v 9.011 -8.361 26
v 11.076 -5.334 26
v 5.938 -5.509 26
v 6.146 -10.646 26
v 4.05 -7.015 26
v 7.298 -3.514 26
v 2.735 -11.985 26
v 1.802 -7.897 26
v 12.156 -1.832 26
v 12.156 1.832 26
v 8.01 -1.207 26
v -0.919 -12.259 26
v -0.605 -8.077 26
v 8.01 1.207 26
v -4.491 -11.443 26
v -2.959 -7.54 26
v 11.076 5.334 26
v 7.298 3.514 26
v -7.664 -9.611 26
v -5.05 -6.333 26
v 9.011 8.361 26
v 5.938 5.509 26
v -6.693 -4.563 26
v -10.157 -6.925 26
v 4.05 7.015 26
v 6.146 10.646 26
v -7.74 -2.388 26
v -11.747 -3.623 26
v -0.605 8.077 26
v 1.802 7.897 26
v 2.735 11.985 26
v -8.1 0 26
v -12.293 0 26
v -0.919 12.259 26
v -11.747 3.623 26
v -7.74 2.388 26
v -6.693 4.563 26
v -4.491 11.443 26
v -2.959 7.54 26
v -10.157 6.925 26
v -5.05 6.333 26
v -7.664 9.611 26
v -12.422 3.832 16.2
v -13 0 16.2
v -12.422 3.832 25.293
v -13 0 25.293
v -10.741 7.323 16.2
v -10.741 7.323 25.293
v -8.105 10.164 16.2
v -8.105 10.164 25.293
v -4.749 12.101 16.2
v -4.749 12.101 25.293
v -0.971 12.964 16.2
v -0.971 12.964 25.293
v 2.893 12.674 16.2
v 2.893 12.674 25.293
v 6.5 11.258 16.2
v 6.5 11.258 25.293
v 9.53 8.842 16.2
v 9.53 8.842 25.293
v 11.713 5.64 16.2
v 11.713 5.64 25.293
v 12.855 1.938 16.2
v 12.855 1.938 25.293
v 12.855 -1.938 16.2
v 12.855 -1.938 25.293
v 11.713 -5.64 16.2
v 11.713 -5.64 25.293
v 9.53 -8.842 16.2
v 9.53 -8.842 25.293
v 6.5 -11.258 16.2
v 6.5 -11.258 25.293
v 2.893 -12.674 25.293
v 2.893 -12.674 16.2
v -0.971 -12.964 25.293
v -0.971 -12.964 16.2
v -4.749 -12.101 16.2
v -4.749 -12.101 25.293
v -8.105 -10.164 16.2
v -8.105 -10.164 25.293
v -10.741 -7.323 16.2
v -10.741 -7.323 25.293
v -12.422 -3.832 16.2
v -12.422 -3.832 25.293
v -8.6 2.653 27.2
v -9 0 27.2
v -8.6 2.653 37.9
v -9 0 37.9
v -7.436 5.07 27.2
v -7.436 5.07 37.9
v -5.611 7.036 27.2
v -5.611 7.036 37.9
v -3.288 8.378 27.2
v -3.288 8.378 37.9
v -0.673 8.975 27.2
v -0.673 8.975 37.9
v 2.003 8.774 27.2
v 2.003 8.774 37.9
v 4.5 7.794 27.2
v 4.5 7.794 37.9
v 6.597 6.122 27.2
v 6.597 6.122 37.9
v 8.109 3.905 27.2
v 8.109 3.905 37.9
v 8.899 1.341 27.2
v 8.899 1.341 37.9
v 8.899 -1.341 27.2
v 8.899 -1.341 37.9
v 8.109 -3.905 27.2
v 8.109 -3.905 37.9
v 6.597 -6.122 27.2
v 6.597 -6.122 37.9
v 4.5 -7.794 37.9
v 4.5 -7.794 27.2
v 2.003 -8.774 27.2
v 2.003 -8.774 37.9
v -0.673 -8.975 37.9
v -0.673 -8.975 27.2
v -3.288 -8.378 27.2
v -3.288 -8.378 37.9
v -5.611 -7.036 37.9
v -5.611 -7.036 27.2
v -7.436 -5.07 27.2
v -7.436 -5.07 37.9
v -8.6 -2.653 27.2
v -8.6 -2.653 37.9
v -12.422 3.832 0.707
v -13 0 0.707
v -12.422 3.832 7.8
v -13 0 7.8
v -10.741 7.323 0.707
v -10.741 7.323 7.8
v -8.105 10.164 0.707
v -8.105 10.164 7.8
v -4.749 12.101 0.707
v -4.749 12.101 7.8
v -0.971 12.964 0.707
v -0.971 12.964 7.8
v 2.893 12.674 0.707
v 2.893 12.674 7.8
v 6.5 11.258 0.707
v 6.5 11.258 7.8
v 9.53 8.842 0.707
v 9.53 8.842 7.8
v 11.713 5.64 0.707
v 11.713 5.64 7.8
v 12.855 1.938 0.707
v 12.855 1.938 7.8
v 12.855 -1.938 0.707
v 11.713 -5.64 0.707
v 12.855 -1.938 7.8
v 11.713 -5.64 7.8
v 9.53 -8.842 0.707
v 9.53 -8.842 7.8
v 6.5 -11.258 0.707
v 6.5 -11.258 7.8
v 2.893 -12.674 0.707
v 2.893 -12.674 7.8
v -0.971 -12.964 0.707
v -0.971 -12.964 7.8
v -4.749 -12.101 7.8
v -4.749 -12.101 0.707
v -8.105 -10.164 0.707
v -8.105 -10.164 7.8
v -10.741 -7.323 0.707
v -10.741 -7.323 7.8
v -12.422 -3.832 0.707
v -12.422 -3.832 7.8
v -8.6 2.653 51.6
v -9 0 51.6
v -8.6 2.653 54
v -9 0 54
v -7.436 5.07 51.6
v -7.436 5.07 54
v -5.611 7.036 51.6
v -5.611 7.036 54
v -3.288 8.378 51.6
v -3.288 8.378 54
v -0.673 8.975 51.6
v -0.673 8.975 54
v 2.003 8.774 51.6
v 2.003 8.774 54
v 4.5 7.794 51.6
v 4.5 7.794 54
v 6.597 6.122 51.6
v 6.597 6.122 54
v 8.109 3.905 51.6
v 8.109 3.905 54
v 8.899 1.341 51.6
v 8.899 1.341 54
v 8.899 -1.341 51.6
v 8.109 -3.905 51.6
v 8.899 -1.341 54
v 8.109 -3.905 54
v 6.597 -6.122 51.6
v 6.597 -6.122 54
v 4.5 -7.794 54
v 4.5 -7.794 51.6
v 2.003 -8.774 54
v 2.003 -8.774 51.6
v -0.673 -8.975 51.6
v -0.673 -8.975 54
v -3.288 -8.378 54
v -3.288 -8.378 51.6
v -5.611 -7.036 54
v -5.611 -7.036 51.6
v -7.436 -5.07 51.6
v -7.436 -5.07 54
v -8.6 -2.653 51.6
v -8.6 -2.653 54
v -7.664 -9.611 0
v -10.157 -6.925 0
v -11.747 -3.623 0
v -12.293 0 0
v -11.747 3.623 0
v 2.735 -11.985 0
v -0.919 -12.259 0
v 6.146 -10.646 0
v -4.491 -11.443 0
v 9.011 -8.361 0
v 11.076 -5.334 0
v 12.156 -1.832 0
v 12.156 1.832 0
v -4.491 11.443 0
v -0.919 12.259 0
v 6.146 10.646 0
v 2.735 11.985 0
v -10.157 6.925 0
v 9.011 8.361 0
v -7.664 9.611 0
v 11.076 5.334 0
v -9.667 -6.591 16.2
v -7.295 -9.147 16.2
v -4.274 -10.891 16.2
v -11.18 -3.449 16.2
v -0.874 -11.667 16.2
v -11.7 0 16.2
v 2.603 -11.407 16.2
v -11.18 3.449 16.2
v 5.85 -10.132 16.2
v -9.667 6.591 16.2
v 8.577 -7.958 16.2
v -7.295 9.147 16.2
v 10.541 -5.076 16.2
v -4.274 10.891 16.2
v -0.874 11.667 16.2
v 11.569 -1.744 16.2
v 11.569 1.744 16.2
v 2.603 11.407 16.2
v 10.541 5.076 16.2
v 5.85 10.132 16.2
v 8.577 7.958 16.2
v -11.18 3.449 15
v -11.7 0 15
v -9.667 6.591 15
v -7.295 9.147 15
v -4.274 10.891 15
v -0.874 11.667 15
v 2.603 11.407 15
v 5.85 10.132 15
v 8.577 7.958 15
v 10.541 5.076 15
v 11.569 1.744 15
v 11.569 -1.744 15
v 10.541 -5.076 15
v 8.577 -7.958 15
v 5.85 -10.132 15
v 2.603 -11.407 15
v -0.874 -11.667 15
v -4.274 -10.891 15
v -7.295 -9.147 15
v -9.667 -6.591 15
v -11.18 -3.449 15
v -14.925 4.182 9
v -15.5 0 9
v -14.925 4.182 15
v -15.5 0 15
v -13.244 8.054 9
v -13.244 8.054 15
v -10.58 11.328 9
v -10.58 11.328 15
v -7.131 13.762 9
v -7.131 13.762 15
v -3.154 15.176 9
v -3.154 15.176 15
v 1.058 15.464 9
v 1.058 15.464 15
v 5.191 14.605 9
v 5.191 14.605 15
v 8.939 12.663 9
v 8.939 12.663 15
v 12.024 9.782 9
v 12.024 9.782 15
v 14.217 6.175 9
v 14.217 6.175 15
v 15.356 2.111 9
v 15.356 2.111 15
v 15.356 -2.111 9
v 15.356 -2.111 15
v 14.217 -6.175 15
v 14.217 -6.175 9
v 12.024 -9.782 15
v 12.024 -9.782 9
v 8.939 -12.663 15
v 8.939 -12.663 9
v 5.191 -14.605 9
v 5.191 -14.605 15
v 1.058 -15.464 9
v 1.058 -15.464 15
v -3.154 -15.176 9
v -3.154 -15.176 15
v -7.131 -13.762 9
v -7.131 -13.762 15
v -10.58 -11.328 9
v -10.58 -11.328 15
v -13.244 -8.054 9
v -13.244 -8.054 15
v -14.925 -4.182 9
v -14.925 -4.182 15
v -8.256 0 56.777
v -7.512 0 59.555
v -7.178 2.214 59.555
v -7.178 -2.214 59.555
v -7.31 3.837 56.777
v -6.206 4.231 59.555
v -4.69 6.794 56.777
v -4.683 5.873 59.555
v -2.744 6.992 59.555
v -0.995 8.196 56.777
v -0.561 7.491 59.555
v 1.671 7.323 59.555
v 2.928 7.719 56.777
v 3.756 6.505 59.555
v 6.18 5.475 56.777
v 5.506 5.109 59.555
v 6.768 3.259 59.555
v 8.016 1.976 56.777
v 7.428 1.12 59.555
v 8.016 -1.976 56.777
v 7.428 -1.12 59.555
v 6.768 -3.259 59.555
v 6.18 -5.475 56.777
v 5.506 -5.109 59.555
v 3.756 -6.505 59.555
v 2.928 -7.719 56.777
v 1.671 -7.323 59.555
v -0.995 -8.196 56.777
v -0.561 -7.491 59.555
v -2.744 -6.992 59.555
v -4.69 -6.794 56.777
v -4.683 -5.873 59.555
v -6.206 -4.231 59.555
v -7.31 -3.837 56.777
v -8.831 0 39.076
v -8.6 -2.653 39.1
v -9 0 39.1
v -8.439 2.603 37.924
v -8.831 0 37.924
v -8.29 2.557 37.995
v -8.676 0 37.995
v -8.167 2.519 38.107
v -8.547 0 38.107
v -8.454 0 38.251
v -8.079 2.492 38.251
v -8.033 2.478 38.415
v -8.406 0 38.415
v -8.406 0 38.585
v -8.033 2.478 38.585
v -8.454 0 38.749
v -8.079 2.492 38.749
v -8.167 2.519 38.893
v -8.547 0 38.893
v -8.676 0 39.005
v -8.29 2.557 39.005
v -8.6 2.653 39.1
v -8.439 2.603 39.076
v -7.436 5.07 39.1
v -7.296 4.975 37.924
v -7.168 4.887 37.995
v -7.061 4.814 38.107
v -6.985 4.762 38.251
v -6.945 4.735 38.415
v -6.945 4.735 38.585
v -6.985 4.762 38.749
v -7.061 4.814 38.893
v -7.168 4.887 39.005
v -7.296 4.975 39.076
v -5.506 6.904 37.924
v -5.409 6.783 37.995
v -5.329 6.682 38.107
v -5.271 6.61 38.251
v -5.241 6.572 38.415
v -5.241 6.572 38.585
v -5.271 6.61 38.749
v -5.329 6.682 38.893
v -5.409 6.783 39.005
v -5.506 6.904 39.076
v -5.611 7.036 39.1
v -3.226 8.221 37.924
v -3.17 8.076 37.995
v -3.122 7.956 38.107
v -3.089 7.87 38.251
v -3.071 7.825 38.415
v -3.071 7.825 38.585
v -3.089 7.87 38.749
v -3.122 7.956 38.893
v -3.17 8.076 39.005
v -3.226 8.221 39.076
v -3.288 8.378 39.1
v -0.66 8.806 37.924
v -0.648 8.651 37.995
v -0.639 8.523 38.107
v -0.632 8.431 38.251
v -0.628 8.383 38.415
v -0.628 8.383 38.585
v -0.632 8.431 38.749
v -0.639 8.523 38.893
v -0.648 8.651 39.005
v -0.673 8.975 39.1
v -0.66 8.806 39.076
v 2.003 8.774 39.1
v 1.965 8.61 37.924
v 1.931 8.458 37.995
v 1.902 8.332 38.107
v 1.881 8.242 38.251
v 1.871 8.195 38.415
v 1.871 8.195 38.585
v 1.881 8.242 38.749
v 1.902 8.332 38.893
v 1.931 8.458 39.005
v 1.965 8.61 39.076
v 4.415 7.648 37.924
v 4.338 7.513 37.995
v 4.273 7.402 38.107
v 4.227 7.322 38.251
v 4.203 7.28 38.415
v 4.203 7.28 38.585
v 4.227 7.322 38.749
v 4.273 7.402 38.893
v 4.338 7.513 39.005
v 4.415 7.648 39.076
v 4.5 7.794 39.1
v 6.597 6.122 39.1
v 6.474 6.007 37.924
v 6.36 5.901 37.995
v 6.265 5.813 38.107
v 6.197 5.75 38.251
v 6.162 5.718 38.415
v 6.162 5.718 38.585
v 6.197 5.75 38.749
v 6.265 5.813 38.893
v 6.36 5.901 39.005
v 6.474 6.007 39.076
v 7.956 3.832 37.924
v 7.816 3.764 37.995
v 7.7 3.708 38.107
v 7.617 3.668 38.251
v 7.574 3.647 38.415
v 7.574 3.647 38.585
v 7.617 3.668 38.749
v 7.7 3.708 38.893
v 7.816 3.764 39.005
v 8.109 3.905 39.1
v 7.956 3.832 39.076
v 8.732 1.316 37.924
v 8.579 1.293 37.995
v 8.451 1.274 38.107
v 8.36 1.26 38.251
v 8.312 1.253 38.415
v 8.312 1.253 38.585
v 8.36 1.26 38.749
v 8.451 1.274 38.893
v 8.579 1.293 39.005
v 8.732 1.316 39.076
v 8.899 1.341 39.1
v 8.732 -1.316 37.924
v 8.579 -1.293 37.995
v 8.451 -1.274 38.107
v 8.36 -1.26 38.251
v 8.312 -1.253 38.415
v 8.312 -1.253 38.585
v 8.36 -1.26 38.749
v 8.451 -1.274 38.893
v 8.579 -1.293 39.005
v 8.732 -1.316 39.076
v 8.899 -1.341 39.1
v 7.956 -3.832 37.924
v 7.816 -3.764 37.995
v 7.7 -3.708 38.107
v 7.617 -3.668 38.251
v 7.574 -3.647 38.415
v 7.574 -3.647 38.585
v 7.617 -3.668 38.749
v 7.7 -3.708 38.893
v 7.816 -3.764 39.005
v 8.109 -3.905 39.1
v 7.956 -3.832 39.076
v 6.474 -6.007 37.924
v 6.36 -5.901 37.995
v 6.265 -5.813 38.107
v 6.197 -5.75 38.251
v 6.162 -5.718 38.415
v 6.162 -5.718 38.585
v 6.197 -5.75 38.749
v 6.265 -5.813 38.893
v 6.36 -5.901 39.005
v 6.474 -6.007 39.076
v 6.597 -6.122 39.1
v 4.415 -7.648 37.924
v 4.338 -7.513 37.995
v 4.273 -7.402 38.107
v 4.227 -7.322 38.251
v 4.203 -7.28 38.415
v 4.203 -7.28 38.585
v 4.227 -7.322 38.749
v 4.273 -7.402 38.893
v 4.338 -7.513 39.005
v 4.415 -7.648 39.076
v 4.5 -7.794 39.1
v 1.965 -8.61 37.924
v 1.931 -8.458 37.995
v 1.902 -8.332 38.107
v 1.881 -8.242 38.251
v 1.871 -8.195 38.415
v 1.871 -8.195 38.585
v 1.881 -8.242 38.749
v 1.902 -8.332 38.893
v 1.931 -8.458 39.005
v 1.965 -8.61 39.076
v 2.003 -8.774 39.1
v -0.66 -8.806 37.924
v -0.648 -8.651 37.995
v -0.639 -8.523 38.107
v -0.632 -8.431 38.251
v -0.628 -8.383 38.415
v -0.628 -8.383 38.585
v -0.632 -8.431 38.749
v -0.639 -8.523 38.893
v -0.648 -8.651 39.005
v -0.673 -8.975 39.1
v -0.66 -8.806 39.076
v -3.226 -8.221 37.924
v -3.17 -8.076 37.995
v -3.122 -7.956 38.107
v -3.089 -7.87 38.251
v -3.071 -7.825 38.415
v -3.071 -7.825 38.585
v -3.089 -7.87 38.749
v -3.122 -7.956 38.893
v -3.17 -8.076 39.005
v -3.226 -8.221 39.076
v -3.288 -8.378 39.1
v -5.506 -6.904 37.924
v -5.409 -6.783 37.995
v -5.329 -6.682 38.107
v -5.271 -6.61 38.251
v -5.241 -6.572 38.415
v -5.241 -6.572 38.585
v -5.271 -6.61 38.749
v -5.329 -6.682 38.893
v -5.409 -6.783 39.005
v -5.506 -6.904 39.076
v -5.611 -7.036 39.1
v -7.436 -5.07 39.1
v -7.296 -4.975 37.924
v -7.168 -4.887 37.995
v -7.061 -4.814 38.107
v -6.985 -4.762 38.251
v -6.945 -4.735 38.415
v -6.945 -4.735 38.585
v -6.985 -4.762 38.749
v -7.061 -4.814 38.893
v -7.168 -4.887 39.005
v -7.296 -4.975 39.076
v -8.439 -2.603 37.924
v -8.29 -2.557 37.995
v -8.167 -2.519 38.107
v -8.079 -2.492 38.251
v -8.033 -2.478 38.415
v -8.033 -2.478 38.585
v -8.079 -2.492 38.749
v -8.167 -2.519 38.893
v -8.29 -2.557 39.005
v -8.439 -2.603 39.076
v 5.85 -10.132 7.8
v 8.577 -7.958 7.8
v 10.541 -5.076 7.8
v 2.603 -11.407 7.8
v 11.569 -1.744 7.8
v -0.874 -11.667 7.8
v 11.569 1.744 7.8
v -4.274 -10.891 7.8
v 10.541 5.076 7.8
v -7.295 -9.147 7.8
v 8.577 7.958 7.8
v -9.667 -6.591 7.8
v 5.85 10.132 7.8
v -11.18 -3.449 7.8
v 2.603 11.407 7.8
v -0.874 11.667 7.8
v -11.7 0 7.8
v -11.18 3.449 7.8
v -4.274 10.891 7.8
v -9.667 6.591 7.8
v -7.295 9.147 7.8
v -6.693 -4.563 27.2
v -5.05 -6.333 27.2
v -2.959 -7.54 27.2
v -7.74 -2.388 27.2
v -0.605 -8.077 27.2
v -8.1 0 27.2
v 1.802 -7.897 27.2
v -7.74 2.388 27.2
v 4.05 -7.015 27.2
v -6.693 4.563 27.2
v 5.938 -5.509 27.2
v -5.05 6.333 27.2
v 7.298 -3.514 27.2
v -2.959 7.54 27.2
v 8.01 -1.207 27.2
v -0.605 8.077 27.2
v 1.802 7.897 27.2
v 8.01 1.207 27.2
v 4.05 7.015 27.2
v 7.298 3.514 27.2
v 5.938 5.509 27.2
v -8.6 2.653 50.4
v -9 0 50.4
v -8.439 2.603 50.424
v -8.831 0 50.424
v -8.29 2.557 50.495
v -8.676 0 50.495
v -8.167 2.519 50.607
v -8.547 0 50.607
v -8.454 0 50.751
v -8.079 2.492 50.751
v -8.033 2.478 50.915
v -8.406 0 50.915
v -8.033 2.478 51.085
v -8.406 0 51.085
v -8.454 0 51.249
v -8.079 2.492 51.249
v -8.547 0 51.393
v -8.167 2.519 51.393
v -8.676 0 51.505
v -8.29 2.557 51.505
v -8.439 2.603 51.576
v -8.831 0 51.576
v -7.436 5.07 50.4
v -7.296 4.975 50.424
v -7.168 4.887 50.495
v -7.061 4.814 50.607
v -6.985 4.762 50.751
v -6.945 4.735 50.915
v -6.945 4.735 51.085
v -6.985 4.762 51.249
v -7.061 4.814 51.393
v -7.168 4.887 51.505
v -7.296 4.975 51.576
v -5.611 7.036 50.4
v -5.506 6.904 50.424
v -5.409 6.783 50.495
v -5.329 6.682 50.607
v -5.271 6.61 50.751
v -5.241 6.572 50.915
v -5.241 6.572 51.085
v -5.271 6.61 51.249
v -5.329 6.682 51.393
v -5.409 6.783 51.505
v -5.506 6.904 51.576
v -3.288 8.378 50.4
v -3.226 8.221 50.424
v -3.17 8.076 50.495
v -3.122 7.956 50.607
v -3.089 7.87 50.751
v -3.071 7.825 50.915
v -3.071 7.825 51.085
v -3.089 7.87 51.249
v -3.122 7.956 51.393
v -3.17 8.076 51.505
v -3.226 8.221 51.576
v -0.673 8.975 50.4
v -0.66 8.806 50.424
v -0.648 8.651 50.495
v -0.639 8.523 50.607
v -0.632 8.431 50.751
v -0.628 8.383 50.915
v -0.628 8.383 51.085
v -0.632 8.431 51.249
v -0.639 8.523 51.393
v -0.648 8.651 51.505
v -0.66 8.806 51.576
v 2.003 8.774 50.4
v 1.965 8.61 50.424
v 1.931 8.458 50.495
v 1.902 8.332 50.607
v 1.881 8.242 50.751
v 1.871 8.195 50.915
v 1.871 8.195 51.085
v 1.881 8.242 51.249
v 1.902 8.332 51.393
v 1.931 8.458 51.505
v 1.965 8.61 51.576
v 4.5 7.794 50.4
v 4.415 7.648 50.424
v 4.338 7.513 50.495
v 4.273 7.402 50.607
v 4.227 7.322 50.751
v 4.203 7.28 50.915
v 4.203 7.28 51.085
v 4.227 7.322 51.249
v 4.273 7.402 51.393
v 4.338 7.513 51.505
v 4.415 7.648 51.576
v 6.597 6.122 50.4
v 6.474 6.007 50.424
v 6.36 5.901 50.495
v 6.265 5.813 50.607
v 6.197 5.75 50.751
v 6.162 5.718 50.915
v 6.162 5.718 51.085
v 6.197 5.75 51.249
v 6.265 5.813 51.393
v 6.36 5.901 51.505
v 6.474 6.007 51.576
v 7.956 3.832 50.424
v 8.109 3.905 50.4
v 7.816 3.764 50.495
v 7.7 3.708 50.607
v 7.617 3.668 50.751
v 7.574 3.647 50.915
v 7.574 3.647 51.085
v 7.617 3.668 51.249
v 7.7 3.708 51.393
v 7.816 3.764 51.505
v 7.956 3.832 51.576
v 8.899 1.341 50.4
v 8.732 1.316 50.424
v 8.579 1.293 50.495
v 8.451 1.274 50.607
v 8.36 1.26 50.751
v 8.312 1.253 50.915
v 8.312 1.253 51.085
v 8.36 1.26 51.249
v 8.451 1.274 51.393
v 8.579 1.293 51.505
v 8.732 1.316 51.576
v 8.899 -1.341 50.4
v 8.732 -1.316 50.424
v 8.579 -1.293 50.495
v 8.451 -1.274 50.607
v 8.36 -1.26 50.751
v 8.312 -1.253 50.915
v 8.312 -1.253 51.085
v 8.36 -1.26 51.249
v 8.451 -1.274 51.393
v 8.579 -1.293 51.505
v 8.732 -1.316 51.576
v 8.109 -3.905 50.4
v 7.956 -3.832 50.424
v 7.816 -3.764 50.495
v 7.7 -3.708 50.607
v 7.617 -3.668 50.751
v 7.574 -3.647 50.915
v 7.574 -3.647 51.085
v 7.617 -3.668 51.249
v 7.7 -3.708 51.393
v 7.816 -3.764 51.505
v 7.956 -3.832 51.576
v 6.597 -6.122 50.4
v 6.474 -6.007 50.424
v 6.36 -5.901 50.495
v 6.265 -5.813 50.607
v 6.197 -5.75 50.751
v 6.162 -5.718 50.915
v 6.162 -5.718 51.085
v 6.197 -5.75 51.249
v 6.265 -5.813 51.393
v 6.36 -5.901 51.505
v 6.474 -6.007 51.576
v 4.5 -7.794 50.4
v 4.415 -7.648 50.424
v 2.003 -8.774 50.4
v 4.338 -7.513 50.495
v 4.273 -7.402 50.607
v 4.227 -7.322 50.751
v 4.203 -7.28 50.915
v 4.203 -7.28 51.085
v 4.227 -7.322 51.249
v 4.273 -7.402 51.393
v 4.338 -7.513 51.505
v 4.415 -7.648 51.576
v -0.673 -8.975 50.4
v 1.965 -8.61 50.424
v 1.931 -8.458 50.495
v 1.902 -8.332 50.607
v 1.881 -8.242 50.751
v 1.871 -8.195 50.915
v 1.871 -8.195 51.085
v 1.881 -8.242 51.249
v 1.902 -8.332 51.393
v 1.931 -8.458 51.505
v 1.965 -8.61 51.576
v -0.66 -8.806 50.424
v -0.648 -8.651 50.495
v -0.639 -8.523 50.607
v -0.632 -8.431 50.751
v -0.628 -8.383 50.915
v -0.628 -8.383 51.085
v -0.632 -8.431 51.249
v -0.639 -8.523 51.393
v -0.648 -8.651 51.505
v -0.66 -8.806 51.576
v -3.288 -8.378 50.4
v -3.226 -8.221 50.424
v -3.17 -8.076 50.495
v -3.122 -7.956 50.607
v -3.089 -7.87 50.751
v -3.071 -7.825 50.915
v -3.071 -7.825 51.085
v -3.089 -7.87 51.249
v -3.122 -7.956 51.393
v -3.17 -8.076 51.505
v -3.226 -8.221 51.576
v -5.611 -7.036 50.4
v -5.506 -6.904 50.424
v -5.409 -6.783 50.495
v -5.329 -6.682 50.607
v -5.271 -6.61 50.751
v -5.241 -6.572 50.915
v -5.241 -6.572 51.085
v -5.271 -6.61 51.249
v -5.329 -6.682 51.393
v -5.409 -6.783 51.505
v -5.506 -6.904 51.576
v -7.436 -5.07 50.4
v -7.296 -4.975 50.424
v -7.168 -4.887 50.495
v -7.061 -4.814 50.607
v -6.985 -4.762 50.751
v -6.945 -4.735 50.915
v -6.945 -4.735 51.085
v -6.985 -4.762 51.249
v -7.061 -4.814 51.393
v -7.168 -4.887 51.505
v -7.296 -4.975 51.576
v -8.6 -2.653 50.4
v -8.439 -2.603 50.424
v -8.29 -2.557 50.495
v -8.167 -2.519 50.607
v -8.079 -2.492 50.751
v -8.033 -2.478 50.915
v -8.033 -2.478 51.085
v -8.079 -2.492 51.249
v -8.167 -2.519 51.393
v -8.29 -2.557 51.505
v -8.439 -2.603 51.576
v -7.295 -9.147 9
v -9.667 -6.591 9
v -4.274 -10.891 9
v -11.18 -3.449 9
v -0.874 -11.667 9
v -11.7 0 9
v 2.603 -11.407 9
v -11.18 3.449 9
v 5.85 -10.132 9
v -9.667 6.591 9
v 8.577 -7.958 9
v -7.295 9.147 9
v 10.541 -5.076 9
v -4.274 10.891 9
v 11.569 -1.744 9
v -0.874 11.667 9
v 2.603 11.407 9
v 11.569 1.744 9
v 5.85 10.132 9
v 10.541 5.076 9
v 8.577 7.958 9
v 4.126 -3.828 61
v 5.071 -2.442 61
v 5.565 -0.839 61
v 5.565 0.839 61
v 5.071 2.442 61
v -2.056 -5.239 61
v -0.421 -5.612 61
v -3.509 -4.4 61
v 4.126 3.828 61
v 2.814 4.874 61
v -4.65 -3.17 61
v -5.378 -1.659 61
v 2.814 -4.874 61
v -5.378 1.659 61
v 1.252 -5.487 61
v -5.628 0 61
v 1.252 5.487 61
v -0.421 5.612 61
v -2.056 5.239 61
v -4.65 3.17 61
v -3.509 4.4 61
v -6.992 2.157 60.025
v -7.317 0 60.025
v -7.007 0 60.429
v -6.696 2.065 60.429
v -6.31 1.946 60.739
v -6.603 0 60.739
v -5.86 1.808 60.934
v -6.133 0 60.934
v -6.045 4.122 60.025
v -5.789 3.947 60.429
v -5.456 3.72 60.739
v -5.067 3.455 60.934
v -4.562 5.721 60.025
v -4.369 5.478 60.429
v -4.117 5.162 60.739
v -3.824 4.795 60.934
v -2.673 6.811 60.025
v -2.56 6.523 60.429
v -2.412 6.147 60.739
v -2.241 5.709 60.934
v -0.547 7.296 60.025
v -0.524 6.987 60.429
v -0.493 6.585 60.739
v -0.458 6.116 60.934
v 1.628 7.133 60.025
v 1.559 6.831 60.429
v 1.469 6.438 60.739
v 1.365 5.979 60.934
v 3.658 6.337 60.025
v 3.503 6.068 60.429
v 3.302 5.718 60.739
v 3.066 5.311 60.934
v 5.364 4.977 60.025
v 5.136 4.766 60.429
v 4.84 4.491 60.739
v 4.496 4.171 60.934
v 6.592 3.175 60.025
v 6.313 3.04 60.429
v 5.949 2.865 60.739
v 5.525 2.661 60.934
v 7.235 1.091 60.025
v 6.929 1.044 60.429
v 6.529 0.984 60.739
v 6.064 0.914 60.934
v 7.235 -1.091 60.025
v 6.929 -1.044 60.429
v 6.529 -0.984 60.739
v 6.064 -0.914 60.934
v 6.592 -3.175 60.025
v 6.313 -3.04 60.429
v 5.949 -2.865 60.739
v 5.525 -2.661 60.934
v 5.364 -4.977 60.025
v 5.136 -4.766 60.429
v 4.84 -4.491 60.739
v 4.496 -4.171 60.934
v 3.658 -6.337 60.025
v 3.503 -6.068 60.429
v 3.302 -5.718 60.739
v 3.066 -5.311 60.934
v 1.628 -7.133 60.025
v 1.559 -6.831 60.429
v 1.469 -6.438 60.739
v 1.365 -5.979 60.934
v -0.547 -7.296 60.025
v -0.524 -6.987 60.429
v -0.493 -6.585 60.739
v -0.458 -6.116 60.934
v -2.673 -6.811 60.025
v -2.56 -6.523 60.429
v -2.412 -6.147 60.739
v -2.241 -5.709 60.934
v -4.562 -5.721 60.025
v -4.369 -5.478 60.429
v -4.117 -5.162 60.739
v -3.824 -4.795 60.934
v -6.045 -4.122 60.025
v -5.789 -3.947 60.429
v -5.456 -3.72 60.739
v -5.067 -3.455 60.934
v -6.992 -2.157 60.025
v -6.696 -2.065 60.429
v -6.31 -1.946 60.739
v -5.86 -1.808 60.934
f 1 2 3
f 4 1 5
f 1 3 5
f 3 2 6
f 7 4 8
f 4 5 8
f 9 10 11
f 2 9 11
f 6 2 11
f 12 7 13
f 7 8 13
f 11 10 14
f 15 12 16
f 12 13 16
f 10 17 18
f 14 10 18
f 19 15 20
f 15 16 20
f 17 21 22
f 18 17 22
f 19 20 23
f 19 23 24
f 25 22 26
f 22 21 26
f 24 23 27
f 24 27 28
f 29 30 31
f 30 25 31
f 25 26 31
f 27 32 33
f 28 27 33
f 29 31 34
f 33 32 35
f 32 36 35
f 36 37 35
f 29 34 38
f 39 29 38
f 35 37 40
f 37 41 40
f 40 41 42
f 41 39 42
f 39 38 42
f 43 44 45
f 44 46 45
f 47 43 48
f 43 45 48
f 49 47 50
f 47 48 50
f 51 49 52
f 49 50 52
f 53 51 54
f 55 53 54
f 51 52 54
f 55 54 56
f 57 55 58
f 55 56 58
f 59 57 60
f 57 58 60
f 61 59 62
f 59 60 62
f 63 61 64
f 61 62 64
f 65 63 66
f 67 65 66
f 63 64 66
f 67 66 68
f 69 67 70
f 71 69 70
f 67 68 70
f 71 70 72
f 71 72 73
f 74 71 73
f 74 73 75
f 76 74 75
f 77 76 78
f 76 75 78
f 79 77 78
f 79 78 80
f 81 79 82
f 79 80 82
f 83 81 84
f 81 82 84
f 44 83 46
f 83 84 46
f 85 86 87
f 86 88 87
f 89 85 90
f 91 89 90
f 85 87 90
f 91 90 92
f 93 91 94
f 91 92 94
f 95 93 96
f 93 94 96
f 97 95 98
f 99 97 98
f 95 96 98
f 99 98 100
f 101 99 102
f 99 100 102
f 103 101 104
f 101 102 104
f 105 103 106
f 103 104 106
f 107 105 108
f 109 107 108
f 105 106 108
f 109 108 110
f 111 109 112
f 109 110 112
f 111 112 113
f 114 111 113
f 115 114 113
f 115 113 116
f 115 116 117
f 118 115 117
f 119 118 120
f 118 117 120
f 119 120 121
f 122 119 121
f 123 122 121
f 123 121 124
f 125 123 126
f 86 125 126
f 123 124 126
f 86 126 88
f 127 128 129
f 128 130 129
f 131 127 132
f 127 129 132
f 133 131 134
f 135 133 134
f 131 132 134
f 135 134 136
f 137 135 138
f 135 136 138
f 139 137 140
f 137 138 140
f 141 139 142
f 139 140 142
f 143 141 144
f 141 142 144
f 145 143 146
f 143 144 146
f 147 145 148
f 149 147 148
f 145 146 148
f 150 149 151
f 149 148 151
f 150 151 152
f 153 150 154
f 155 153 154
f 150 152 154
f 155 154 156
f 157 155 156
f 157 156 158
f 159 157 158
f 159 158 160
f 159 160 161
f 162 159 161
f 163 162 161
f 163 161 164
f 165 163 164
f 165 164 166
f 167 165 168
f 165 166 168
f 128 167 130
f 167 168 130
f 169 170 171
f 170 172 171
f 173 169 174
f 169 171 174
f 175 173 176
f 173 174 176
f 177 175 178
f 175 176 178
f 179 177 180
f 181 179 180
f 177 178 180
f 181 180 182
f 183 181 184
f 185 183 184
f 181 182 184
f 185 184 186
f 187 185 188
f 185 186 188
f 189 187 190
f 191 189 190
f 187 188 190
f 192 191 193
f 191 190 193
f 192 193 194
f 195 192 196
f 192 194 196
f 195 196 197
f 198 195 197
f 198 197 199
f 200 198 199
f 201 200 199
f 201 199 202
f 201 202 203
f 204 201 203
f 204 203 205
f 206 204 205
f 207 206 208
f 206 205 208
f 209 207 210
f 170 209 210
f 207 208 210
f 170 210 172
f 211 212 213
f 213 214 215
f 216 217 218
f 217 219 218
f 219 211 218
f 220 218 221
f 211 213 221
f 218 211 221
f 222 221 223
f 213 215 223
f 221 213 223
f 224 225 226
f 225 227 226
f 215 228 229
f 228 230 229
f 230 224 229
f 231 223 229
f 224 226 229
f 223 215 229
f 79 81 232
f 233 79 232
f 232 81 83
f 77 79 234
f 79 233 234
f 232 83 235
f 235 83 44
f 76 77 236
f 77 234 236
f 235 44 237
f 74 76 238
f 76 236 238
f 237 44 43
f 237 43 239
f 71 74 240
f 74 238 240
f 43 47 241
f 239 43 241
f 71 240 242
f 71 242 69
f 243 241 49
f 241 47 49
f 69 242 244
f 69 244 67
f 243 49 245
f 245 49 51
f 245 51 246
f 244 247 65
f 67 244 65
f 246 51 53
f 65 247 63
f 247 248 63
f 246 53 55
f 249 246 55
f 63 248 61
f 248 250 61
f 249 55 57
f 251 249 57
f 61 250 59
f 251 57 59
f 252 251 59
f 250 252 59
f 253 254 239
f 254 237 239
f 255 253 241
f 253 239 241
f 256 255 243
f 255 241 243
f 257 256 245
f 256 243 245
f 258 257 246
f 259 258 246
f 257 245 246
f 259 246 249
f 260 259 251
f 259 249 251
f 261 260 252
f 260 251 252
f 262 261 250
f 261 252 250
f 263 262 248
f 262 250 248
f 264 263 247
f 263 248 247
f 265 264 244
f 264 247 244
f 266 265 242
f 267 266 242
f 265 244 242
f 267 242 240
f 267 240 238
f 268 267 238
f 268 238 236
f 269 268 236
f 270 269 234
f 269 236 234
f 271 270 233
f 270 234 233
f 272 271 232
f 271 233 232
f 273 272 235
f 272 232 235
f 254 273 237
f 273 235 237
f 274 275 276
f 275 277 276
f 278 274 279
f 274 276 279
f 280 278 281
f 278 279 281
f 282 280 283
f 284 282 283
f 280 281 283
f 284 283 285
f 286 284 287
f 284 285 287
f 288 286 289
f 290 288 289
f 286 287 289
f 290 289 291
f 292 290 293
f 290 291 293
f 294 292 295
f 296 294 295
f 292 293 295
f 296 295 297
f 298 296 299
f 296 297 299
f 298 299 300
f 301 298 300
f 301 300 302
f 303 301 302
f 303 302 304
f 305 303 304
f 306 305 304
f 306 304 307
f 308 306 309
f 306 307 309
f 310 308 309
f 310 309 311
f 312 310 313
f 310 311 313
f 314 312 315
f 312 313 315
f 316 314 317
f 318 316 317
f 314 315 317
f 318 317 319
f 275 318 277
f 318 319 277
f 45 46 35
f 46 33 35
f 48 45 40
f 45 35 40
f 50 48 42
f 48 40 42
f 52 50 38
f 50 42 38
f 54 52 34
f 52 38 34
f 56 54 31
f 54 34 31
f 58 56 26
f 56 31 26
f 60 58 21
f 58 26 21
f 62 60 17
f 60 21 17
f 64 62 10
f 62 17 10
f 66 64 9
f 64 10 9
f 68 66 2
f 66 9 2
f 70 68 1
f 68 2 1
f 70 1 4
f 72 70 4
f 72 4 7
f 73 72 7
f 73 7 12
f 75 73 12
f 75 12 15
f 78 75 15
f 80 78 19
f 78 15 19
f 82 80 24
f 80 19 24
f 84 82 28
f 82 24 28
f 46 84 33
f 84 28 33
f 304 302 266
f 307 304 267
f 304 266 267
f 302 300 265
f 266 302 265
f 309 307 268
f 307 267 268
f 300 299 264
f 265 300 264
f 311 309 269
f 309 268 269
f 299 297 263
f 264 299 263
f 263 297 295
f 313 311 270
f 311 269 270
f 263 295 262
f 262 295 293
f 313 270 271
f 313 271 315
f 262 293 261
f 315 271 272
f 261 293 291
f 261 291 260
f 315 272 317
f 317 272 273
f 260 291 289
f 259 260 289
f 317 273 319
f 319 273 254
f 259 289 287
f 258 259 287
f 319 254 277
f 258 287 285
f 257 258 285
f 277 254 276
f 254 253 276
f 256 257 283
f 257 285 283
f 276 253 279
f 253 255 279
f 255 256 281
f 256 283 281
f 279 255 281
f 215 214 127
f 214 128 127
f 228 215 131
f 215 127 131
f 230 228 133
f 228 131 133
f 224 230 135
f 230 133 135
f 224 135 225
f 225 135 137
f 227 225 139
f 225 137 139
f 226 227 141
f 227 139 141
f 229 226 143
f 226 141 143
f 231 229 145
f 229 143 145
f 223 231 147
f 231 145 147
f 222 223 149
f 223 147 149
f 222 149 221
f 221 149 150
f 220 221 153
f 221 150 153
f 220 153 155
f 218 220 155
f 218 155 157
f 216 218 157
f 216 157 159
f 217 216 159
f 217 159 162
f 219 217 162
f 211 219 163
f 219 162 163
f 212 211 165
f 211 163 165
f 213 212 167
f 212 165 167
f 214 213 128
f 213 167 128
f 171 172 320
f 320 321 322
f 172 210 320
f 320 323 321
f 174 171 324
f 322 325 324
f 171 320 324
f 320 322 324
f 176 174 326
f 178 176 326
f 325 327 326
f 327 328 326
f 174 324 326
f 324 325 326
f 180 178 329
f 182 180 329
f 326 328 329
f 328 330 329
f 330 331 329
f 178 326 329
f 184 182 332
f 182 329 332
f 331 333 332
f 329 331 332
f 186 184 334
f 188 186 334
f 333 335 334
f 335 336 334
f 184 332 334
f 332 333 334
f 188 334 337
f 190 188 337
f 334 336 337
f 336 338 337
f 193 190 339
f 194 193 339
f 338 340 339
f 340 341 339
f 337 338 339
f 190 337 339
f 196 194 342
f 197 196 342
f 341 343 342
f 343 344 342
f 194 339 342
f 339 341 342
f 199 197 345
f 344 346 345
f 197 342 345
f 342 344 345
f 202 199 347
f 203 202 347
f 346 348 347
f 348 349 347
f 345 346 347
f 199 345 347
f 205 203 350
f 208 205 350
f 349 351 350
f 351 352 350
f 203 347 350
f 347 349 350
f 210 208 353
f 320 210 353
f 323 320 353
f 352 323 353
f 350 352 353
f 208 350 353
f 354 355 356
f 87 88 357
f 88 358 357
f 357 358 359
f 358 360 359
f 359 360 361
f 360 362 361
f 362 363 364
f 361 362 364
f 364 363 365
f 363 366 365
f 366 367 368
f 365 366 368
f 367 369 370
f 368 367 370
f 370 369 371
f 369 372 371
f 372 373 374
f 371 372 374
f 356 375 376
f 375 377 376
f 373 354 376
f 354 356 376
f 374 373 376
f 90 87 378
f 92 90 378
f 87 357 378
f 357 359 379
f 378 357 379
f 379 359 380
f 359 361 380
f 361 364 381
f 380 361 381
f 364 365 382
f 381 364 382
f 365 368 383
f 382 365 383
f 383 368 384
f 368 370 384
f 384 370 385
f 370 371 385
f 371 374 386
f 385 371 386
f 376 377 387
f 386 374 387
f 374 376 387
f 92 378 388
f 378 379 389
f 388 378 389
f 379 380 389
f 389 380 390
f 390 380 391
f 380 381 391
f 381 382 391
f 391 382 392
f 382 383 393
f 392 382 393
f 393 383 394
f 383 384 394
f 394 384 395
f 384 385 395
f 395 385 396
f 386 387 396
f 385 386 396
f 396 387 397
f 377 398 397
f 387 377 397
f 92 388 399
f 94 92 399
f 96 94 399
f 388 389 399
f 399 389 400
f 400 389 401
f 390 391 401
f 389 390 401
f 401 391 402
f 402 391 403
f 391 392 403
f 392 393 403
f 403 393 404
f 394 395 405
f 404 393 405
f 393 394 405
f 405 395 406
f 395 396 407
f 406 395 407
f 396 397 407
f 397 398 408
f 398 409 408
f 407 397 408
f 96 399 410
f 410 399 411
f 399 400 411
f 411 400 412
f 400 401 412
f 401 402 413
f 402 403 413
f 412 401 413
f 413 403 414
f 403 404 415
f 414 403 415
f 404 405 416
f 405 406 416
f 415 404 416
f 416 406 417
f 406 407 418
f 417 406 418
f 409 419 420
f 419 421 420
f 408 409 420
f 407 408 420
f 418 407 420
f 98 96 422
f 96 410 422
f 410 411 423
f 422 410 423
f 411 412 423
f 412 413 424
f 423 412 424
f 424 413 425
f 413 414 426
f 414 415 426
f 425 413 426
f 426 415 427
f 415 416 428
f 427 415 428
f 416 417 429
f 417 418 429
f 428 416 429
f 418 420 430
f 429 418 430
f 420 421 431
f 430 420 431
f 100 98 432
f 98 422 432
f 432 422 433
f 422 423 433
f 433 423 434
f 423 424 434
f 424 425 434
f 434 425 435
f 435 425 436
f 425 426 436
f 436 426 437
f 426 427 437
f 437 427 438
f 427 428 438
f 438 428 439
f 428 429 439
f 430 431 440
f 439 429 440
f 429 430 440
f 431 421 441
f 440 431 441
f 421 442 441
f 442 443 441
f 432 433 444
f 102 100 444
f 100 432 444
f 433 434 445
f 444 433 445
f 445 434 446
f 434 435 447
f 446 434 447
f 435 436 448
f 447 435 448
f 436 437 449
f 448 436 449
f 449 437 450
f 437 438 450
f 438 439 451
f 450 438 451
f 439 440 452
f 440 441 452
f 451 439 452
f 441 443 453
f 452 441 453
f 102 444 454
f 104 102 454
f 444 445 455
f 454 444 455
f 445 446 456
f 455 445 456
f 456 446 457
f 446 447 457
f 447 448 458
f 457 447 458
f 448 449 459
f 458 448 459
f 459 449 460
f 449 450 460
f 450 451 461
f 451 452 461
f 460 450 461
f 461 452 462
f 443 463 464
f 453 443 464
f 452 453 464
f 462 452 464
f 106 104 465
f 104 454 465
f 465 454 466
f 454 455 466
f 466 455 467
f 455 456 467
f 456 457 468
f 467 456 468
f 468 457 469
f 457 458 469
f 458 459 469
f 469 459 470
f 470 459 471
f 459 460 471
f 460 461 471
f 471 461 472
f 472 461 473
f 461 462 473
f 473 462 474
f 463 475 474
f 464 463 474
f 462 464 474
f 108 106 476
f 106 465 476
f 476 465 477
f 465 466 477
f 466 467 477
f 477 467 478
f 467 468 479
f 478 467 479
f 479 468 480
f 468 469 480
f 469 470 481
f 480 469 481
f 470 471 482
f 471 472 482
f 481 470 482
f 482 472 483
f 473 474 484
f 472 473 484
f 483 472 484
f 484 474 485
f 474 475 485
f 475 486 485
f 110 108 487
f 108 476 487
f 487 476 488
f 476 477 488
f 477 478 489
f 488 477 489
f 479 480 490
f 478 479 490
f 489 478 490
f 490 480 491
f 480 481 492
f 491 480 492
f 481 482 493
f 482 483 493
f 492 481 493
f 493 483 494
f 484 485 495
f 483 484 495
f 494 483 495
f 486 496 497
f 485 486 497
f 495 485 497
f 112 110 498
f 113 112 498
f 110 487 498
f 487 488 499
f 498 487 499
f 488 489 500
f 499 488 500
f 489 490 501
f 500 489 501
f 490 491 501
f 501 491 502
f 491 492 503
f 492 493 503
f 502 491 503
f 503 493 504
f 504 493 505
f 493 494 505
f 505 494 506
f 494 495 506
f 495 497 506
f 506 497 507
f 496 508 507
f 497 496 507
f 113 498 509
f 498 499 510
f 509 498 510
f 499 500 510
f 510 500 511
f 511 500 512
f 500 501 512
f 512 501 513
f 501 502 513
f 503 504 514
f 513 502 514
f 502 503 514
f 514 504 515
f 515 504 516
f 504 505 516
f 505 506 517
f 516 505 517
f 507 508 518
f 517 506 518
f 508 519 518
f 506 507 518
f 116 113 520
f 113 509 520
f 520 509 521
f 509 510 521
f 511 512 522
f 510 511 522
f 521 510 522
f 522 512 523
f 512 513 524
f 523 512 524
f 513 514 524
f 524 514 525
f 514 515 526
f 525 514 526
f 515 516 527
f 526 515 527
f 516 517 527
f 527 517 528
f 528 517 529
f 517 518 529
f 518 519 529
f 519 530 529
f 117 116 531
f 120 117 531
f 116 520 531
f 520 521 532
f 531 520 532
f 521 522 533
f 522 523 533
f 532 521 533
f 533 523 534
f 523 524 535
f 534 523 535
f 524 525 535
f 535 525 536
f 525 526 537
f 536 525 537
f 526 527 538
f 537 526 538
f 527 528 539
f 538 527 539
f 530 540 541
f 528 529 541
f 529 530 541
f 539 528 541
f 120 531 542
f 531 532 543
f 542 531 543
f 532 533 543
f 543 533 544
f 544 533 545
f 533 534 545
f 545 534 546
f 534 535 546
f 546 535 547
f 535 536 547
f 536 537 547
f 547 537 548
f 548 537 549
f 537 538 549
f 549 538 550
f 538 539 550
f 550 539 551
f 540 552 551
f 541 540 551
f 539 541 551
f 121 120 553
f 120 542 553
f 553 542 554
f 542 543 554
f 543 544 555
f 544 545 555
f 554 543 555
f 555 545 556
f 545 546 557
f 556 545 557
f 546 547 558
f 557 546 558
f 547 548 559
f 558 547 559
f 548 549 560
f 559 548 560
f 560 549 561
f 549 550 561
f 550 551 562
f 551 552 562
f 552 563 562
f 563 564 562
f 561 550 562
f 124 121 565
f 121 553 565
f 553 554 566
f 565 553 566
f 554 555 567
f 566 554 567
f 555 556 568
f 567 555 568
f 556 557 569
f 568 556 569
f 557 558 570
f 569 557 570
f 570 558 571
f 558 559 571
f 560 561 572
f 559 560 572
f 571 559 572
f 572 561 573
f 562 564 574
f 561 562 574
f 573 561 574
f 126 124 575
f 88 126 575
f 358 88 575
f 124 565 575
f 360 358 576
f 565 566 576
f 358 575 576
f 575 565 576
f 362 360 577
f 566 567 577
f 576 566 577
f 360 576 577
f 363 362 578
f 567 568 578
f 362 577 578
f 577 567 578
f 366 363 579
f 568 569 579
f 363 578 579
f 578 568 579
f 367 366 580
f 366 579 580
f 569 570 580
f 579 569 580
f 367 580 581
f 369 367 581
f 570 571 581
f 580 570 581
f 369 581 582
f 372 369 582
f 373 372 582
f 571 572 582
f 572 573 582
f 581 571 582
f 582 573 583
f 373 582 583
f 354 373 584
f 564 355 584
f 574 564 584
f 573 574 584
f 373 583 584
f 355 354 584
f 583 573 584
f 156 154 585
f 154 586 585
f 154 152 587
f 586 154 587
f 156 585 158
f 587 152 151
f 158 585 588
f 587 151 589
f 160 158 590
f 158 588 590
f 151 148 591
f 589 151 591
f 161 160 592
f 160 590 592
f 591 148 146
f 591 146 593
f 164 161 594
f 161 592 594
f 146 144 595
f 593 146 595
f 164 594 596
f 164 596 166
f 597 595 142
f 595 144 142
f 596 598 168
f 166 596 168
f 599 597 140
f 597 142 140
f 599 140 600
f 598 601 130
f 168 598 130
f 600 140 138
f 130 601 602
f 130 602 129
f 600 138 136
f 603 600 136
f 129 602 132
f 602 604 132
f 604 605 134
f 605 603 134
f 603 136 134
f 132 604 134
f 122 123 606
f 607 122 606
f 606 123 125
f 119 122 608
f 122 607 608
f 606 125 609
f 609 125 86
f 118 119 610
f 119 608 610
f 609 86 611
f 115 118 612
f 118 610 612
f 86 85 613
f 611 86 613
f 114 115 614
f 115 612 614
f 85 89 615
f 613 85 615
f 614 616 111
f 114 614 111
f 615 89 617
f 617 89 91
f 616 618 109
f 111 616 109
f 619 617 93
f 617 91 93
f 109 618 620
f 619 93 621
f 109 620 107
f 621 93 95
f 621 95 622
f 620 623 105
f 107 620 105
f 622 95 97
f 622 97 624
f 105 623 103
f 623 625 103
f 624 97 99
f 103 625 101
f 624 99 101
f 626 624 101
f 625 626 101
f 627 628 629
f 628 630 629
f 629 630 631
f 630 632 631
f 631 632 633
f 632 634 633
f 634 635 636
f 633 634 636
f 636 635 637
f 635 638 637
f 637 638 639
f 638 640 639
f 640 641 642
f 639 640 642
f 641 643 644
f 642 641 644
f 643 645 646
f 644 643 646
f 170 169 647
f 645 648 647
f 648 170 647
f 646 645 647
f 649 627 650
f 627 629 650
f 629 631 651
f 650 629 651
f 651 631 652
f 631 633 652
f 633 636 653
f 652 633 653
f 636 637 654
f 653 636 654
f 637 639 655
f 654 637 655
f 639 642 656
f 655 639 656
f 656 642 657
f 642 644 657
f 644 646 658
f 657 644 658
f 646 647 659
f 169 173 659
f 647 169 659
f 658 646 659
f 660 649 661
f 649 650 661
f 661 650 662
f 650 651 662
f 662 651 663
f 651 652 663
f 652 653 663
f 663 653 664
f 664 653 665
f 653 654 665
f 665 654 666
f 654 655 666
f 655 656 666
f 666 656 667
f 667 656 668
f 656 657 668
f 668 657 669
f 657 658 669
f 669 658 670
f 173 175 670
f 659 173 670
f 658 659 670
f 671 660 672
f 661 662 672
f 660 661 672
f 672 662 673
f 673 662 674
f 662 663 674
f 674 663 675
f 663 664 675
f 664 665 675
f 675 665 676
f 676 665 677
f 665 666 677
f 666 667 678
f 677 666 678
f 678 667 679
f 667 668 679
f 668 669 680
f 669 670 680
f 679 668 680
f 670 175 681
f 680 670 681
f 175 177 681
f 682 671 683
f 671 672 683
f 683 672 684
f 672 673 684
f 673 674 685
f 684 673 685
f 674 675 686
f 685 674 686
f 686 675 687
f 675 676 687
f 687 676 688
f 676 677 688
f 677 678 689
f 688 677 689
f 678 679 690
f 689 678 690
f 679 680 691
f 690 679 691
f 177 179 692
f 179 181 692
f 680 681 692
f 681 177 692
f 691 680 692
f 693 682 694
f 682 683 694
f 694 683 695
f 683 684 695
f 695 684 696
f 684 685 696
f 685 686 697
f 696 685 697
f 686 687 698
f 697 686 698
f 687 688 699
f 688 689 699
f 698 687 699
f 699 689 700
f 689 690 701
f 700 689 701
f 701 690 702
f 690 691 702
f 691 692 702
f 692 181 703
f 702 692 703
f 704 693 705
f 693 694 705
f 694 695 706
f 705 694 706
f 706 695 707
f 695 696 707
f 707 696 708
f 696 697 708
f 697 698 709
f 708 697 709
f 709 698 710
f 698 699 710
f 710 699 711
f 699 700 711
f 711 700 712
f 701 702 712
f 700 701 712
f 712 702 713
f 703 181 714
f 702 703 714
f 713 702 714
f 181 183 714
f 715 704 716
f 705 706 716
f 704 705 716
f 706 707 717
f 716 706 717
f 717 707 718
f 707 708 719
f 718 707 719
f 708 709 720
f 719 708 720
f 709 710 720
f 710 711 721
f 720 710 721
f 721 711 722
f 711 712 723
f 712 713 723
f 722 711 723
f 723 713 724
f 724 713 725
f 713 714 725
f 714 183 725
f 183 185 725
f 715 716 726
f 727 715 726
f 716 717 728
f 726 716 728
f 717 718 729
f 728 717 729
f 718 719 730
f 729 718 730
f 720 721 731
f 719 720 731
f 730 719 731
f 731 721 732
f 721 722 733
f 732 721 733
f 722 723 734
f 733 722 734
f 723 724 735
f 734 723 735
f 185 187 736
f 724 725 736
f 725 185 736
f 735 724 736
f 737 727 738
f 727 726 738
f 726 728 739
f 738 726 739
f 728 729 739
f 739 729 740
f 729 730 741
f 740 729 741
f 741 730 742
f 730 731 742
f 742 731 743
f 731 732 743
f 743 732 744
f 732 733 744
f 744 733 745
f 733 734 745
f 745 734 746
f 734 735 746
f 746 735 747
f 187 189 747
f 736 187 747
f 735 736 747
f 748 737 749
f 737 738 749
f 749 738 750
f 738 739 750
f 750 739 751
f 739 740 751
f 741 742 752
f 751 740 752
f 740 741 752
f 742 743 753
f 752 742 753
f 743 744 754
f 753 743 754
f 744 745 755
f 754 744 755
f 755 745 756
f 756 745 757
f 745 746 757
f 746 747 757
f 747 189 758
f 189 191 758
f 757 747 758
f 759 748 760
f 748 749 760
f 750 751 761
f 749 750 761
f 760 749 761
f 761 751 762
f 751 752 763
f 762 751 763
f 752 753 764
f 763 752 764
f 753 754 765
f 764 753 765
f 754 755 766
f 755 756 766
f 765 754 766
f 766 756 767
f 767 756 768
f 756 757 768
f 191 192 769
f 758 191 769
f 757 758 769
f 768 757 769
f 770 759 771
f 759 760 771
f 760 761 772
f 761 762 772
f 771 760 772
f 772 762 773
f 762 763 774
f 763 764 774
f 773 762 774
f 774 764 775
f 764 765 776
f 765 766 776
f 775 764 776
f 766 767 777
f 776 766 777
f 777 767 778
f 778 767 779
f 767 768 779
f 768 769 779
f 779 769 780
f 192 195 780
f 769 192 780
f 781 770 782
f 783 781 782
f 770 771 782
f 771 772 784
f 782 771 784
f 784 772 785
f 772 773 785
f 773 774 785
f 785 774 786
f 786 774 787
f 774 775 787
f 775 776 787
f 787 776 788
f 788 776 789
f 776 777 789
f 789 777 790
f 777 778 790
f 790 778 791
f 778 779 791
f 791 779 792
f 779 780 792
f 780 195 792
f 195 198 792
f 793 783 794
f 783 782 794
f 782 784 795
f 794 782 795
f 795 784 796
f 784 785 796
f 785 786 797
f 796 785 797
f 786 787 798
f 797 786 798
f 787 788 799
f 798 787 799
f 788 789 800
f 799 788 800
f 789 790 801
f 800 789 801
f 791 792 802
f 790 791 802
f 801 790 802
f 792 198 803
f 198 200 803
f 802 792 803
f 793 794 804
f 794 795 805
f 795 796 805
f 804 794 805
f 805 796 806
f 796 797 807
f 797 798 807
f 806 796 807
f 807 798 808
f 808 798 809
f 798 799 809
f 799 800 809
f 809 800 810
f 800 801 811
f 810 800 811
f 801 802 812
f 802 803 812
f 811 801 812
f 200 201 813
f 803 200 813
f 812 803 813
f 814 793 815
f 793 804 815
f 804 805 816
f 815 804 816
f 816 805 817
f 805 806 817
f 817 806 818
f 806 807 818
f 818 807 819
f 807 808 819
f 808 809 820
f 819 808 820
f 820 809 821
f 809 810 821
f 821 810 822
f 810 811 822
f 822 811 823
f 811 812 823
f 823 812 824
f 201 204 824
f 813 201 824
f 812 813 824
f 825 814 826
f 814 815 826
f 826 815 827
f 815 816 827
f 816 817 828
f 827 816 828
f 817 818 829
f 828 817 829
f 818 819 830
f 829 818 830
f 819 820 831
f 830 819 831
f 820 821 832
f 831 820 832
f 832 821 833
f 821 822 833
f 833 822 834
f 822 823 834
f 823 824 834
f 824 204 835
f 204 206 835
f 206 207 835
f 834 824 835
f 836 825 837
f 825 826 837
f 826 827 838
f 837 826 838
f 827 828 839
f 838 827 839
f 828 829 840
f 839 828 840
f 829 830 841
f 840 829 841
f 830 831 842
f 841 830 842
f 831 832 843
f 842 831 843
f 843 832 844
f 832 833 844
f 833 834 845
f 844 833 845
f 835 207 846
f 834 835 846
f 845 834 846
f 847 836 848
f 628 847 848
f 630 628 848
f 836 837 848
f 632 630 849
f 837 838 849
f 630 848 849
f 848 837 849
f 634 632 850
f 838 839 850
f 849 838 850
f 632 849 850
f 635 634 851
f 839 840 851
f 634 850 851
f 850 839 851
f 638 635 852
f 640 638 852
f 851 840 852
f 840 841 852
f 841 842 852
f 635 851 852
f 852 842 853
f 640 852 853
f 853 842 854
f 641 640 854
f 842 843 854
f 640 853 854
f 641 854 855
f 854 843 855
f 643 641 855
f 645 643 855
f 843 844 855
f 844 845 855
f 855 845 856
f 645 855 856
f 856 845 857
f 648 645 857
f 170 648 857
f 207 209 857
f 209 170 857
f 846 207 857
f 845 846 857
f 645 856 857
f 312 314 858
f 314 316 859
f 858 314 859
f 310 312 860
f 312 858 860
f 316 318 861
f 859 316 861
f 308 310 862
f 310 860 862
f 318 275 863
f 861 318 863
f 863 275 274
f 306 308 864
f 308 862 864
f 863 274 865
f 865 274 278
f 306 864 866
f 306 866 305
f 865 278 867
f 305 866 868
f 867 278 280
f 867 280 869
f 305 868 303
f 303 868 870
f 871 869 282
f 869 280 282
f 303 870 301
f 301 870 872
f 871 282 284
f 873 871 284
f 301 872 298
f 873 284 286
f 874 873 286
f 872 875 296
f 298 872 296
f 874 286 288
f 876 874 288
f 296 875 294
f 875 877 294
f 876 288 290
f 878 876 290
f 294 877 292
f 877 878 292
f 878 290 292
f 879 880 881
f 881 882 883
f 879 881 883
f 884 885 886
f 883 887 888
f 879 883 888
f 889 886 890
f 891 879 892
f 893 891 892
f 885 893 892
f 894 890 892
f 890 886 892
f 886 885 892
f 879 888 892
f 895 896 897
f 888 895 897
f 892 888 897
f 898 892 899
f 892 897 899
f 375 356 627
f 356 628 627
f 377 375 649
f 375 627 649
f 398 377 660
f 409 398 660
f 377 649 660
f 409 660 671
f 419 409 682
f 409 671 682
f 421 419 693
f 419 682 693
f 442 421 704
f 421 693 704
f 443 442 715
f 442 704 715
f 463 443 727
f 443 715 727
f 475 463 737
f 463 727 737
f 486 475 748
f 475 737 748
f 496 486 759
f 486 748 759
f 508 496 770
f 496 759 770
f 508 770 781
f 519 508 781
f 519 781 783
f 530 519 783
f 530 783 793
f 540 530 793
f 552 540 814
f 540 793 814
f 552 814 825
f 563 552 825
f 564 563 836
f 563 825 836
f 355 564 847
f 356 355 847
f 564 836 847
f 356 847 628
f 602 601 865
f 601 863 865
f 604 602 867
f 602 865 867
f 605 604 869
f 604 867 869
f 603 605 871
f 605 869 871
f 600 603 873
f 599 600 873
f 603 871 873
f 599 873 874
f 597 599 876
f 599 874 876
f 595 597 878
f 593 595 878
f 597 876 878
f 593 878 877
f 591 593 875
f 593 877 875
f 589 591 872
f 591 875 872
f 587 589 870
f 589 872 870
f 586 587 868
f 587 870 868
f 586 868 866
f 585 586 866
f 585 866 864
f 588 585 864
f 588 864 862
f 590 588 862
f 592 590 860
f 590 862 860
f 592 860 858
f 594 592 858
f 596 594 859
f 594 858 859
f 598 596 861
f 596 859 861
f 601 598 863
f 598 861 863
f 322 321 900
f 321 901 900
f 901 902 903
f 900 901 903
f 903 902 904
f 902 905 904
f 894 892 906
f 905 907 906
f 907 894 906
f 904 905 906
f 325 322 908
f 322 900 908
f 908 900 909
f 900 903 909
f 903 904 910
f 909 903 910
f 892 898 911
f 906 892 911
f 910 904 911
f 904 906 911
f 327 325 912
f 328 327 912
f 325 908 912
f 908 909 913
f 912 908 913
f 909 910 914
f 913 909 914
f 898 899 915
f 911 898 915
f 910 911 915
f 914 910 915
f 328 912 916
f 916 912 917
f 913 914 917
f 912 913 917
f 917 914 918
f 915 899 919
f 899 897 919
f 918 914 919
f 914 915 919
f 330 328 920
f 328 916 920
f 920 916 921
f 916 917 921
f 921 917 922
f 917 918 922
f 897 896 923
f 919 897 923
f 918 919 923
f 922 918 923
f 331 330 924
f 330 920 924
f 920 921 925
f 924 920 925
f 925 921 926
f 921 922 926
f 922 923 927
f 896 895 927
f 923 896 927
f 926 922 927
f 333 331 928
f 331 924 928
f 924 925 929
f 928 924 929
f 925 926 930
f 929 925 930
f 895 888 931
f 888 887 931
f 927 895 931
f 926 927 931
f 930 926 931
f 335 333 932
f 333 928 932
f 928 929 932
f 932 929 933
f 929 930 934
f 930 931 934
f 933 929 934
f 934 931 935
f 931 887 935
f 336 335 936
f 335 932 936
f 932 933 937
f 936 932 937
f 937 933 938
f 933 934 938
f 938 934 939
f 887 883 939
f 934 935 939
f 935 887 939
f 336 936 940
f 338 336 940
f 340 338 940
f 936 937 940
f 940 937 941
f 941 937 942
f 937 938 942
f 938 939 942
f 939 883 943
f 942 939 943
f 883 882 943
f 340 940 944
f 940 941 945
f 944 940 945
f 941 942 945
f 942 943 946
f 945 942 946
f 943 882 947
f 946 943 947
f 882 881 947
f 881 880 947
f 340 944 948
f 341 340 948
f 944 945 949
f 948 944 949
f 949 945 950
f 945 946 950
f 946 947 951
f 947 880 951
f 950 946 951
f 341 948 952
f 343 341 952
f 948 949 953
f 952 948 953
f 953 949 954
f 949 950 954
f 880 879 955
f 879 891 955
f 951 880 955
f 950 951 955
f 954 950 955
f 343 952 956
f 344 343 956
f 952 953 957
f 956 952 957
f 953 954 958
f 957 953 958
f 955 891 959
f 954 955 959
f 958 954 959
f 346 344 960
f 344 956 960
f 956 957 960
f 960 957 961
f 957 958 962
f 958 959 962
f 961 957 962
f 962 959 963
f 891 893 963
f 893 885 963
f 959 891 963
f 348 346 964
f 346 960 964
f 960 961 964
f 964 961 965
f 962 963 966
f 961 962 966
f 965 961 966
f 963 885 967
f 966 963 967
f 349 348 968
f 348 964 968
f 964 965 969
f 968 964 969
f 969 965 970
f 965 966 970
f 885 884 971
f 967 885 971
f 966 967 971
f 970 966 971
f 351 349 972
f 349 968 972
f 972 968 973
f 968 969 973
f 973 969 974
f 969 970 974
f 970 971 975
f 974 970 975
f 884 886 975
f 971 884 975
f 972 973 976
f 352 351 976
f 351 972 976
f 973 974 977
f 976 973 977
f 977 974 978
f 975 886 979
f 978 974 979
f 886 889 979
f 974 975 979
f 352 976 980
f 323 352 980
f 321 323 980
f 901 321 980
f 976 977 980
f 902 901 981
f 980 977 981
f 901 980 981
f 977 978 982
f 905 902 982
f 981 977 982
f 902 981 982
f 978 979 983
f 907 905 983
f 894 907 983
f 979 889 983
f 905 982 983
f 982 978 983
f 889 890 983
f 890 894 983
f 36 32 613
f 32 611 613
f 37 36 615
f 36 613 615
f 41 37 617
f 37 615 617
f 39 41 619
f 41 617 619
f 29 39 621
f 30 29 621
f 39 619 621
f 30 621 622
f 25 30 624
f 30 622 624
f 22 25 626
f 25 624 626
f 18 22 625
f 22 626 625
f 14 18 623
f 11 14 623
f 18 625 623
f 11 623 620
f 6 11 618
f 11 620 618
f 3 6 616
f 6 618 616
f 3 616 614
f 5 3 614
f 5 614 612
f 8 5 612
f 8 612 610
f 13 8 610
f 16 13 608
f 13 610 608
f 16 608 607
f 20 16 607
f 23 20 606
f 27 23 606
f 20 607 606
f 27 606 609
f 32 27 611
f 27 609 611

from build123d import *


with BuildPart() as part:
    # Эскиз1 → Повернуть1 (revolve)
    with BuildSketch(Plane.XZ, mode=Mode.PRIVATE) as revolve_1_sk:
        with BuildLine():
            Line((5.628068026, 61), (0, 61))
            Line((0, 61), (0, 0))
            Line((0, 0), (12.292893219, 0))
            Line((12.292893219, 0), (13, 0.707106781))
            Line((13, 0.707106781), (13, 7.8))
            Line((13, 7.8), (11.7, 7.8))
            Line((11.7, 7.8), (11.7, 9))
            Line((11.7, 9), (15.5, 9))
            Line((15.5, 9), (15.5, 15))
            Line((15.5, 15), (11.7, 15))
            Line((11.7, 15), (11.7, 16.2))
            Line((11.7, 16.2), (13, 16.2))
            Line((13, 16.2), (13, 25.292893219))
            Line((13, 25.292893219), (12.292893219, 26))
            Line((12.292893219, 26), (8.1, 26))
            Line((8.1, 26), (8.1, 27.2))
            Line((8.1, 27.2), (9, 27.2))
            Line((9, 27.2), (9, 37.8999999))
            ThreePointArc((9, 37.8999999), (8.4, 38.4999999), (9, 39.0999999))
            Line((9, 39.0999999), (9, 50.4))
            ThreePointArc((9, 50.4), (8.4, 51), (9, 51.6))
            Line((9, 51.6), (9, 54))
            Line((9, 54), (7.511623388, 59.554697138))
            ThreePointArc((7.511623388, 59.554697138), (6.815152813, 60.597039014), (5.628068026, 61))
        make_face()
    revolve(revolve_1_sk.sketch.rotate(Axis((0, 0, 61.005), (0, 0, -1)), 180), axis=Axis((0, 0, 61.005), (0, 0, -1)))


solid = part.part
